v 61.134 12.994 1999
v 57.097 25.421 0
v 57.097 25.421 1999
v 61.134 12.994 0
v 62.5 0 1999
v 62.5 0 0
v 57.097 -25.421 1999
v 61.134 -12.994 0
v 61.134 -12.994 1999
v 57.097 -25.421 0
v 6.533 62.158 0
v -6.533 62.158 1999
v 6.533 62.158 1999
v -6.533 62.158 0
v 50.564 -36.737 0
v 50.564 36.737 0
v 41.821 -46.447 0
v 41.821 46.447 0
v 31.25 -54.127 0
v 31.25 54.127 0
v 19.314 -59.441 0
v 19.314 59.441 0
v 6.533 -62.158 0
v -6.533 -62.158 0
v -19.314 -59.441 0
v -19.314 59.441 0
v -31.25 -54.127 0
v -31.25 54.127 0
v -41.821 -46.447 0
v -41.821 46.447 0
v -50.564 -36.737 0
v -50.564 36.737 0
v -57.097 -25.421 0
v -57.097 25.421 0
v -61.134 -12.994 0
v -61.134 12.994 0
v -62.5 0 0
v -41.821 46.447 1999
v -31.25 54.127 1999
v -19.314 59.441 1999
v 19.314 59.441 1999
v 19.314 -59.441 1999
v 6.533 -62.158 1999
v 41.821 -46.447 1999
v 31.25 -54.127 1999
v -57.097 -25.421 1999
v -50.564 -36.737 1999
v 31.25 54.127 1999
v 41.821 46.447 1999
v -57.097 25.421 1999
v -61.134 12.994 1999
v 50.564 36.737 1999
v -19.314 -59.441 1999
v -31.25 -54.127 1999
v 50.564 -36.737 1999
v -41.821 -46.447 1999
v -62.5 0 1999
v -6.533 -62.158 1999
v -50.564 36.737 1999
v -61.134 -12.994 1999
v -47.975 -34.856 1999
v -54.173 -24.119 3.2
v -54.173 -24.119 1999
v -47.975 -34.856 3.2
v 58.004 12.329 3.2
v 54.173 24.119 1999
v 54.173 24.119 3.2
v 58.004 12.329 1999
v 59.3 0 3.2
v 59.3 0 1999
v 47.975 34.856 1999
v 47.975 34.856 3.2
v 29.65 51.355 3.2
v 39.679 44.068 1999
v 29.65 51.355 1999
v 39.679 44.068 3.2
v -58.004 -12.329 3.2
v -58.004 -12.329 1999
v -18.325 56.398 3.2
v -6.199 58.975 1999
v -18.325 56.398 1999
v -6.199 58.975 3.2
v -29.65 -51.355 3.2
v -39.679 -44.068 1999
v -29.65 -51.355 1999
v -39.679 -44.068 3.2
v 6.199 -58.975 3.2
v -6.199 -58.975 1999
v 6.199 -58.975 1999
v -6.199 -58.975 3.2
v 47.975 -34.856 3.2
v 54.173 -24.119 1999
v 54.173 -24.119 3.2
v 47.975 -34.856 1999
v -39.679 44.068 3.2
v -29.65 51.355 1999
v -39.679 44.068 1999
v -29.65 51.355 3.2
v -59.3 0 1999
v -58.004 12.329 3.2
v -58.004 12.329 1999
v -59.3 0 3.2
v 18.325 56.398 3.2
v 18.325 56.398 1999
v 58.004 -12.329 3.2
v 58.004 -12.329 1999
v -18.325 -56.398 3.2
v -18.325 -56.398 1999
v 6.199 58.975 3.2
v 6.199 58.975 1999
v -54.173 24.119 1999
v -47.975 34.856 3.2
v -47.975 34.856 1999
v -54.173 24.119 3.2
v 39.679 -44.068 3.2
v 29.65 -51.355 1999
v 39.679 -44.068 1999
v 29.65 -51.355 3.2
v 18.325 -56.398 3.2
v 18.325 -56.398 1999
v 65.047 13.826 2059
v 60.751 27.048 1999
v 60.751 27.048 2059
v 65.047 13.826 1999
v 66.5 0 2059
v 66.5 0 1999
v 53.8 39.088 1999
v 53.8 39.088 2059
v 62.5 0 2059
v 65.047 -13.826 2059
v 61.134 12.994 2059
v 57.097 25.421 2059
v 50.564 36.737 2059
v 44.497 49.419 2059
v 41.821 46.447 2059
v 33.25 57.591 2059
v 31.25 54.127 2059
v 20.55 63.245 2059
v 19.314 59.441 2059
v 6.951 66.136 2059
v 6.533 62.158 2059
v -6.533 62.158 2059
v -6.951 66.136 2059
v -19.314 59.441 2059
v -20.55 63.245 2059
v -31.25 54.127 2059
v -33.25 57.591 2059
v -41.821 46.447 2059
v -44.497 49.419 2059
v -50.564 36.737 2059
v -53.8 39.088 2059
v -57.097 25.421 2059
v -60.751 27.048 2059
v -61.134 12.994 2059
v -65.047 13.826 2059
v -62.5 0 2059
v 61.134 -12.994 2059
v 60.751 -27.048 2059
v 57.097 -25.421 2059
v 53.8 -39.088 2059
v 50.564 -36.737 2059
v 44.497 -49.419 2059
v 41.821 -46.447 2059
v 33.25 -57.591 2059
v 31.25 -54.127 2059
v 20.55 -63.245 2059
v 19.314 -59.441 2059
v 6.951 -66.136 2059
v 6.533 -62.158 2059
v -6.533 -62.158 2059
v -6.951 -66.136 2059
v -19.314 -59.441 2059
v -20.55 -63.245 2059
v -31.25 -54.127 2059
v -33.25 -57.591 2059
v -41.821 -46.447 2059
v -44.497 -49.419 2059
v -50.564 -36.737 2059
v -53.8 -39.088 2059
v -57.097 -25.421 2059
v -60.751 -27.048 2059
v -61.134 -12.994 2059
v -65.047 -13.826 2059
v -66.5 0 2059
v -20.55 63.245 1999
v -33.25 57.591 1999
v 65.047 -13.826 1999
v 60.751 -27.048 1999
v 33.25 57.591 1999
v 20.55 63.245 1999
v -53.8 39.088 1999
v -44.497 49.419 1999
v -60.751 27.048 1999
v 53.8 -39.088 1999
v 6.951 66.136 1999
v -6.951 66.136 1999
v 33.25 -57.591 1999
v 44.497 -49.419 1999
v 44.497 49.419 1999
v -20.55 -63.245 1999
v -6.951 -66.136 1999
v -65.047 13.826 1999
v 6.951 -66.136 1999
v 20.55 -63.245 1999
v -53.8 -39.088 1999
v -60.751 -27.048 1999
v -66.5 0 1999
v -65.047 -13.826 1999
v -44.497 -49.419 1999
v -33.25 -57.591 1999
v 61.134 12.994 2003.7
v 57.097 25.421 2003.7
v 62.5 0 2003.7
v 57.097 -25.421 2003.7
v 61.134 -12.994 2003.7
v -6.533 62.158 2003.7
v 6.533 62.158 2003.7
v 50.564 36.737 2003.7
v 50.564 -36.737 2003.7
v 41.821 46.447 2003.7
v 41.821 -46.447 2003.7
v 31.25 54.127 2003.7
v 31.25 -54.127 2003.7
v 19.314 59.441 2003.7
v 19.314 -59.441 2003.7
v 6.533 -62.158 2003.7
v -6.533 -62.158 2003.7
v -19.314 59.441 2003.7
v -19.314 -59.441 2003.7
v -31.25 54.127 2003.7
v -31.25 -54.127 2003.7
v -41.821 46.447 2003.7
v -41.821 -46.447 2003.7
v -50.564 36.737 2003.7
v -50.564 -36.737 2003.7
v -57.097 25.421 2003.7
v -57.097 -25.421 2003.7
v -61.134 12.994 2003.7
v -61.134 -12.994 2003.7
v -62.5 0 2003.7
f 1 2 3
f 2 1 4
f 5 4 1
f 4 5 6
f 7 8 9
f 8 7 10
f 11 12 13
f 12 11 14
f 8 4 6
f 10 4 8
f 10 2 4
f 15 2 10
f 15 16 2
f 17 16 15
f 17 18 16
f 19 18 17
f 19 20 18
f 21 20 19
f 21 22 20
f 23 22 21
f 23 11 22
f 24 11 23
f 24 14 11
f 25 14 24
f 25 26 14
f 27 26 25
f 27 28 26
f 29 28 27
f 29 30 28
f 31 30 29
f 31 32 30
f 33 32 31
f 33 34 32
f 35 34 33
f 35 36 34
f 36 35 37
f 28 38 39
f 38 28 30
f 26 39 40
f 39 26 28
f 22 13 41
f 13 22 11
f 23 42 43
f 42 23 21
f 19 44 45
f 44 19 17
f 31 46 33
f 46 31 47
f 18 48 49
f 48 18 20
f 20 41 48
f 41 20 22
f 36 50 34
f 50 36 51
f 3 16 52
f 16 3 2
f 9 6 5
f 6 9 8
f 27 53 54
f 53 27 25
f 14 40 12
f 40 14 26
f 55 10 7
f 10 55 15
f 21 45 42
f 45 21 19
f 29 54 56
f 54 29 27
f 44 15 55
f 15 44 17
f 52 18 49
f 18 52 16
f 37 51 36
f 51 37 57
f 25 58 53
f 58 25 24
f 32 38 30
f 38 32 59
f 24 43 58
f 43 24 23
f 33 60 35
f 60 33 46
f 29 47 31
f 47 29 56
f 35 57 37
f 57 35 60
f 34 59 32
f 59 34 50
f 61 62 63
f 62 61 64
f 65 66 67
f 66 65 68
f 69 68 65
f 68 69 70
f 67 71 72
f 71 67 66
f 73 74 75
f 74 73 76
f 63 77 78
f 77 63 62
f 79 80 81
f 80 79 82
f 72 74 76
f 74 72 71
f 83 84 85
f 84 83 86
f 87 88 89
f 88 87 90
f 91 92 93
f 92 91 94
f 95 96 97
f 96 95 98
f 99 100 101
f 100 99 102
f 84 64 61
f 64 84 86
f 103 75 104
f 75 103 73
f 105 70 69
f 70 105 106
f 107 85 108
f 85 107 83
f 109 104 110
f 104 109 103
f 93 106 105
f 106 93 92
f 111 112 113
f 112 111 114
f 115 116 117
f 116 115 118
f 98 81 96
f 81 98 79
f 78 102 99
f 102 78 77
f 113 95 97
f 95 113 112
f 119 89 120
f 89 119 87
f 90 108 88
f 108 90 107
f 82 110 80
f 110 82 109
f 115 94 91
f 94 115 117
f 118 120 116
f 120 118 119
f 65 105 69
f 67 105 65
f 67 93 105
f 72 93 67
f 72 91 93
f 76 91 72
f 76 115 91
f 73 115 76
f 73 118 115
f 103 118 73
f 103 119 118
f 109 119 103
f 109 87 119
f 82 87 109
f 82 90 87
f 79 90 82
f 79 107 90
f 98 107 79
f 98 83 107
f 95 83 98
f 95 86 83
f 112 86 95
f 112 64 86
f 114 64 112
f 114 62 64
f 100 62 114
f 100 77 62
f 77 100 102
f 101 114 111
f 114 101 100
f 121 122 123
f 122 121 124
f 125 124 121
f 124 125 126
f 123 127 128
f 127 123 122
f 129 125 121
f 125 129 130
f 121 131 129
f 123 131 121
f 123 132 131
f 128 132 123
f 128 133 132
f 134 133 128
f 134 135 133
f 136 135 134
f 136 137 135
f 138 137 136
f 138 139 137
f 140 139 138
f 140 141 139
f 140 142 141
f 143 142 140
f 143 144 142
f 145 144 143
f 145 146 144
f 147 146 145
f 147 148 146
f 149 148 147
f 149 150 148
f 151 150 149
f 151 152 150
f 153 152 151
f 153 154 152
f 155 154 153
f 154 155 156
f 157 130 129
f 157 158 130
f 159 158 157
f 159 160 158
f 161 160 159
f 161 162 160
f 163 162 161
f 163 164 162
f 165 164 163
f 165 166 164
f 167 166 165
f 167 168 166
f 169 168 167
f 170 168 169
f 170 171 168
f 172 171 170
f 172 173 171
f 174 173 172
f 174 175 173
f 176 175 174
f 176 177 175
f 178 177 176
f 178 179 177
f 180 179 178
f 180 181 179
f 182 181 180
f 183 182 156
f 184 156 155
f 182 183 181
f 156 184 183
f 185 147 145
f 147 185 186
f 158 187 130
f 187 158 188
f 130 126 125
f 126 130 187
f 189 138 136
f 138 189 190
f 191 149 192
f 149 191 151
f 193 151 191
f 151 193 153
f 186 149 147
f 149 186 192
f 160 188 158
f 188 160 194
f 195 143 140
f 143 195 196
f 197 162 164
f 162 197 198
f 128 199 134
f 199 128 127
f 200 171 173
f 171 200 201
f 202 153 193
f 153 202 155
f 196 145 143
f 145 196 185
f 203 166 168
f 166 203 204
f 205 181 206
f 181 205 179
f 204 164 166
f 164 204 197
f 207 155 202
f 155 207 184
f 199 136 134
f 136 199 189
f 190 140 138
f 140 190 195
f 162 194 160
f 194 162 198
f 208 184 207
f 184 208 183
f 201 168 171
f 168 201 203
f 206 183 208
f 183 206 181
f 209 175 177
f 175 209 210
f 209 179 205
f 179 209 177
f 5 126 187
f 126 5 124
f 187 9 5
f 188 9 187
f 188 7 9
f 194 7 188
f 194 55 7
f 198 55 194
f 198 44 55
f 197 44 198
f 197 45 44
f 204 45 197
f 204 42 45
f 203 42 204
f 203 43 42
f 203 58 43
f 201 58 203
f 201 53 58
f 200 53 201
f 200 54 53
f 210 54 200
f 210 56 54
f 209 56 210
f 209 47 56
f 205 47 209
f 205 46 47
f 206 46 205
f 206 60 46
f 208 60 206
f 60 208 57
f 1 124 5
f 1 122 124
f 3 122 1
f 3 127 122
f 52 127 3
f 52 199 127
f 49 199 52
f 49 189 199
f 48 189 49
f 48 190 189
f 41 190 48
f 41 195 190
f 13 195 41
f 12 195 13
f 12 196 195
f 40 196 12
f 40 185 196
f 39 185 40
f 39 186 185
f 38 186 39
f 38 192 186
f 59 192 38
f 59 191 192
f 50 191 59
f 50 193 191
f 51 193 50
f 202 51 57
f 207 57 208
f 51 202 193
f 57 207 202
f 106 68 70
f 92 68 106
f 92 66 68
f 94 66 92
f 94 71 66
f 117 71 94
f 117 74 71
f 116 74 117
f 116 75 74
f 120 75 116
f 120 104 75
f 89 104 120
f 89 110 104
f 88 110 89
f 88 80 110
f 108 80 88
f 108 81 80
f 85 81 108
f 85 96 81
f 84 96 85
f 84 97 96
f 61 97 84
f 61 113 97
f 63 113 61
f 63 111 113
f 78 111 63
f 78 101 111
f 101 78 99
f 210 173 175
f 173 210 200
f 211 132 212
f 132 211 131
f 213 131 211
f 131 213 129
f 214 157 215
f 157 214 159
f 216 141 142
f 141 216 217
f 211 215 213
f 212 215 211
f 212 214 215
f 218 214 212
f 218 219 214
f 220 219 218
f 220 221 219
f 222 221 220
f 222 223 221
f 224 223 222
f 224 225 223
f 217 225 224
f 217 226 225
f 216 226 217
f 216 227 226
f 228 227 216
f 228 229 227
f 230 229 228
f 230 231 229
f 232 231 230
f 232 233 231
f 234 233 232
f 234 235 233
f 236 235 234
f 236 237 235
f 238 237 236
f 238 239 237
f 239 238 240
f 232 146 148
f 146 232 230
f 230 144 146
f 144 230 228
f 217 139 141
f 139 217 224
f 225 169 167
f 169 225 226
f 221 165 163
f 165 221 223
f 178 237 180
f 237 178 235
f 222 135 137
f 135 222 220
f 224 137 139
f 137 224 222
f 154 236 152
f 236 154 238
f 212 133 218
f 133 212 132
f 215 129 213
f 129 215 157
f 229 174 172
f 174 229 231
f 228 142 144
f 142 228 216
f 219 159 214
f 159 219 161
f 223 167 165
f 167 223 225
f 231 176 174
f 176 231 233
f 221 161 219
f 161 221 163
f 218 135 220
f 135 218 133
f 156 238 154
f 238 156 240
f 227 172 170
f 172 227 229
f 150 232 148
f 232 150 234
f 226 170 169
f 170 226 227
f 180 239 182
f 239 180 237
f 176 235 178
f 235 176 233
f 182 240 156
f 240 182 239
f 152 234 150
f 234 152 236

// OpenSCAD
// Parameters
pipe_standard = 1; //[1:1:1]
nominal_diameter_mm = 125; //[63:250:1]
length_mm = 2000; //[1000:4000:10]
wall_thickness_mm = 3.2; //[2:6.5:0.1]
od_mm = 125; //[63:250:1]
id_mm = 118.6; //[50:245:0.1]
fitting_length_mm = 60; //[30:120:1]
fitting_od_increase_mm = 8; //[3:20:0.5]
fitting_wall_extra_mm = 1.5; //[0.5:4:0.1]
overlap_mm = 1; //[0.5:2:0.1]

// HT Pipe - complete geometry
module ht_pipe() {
  color([0.85, 0.85, 0.8]) {
    // Pipe Body
    difference() {
      cylinder(h=length_mm, r=od_mm/2, center=false);
      translate([0, 0, wall_thickness_mm])
        cylinder(h=length_mm, r=id_mm/2, center=false);
    }
    
    // End Fitting
    difference() {
      translate([0, 0, length_mm - overlap_mm])
        cylinder(h=fitting_length_mm, r=(od_mm + fitting_od_increase_mm)/2, center=false);
      translate([0, 0, length_mm - overlap_mm + (wall_thickness_mm + fitting_wall_extra_mm)])
        cylinder(h=fitting_length_mm, r=(id_mm/2) + wall_thickness_mm, center=false);
    }
  }
}

// Assembly
module assembly() {
  ht_pipe();
}

assembly();
